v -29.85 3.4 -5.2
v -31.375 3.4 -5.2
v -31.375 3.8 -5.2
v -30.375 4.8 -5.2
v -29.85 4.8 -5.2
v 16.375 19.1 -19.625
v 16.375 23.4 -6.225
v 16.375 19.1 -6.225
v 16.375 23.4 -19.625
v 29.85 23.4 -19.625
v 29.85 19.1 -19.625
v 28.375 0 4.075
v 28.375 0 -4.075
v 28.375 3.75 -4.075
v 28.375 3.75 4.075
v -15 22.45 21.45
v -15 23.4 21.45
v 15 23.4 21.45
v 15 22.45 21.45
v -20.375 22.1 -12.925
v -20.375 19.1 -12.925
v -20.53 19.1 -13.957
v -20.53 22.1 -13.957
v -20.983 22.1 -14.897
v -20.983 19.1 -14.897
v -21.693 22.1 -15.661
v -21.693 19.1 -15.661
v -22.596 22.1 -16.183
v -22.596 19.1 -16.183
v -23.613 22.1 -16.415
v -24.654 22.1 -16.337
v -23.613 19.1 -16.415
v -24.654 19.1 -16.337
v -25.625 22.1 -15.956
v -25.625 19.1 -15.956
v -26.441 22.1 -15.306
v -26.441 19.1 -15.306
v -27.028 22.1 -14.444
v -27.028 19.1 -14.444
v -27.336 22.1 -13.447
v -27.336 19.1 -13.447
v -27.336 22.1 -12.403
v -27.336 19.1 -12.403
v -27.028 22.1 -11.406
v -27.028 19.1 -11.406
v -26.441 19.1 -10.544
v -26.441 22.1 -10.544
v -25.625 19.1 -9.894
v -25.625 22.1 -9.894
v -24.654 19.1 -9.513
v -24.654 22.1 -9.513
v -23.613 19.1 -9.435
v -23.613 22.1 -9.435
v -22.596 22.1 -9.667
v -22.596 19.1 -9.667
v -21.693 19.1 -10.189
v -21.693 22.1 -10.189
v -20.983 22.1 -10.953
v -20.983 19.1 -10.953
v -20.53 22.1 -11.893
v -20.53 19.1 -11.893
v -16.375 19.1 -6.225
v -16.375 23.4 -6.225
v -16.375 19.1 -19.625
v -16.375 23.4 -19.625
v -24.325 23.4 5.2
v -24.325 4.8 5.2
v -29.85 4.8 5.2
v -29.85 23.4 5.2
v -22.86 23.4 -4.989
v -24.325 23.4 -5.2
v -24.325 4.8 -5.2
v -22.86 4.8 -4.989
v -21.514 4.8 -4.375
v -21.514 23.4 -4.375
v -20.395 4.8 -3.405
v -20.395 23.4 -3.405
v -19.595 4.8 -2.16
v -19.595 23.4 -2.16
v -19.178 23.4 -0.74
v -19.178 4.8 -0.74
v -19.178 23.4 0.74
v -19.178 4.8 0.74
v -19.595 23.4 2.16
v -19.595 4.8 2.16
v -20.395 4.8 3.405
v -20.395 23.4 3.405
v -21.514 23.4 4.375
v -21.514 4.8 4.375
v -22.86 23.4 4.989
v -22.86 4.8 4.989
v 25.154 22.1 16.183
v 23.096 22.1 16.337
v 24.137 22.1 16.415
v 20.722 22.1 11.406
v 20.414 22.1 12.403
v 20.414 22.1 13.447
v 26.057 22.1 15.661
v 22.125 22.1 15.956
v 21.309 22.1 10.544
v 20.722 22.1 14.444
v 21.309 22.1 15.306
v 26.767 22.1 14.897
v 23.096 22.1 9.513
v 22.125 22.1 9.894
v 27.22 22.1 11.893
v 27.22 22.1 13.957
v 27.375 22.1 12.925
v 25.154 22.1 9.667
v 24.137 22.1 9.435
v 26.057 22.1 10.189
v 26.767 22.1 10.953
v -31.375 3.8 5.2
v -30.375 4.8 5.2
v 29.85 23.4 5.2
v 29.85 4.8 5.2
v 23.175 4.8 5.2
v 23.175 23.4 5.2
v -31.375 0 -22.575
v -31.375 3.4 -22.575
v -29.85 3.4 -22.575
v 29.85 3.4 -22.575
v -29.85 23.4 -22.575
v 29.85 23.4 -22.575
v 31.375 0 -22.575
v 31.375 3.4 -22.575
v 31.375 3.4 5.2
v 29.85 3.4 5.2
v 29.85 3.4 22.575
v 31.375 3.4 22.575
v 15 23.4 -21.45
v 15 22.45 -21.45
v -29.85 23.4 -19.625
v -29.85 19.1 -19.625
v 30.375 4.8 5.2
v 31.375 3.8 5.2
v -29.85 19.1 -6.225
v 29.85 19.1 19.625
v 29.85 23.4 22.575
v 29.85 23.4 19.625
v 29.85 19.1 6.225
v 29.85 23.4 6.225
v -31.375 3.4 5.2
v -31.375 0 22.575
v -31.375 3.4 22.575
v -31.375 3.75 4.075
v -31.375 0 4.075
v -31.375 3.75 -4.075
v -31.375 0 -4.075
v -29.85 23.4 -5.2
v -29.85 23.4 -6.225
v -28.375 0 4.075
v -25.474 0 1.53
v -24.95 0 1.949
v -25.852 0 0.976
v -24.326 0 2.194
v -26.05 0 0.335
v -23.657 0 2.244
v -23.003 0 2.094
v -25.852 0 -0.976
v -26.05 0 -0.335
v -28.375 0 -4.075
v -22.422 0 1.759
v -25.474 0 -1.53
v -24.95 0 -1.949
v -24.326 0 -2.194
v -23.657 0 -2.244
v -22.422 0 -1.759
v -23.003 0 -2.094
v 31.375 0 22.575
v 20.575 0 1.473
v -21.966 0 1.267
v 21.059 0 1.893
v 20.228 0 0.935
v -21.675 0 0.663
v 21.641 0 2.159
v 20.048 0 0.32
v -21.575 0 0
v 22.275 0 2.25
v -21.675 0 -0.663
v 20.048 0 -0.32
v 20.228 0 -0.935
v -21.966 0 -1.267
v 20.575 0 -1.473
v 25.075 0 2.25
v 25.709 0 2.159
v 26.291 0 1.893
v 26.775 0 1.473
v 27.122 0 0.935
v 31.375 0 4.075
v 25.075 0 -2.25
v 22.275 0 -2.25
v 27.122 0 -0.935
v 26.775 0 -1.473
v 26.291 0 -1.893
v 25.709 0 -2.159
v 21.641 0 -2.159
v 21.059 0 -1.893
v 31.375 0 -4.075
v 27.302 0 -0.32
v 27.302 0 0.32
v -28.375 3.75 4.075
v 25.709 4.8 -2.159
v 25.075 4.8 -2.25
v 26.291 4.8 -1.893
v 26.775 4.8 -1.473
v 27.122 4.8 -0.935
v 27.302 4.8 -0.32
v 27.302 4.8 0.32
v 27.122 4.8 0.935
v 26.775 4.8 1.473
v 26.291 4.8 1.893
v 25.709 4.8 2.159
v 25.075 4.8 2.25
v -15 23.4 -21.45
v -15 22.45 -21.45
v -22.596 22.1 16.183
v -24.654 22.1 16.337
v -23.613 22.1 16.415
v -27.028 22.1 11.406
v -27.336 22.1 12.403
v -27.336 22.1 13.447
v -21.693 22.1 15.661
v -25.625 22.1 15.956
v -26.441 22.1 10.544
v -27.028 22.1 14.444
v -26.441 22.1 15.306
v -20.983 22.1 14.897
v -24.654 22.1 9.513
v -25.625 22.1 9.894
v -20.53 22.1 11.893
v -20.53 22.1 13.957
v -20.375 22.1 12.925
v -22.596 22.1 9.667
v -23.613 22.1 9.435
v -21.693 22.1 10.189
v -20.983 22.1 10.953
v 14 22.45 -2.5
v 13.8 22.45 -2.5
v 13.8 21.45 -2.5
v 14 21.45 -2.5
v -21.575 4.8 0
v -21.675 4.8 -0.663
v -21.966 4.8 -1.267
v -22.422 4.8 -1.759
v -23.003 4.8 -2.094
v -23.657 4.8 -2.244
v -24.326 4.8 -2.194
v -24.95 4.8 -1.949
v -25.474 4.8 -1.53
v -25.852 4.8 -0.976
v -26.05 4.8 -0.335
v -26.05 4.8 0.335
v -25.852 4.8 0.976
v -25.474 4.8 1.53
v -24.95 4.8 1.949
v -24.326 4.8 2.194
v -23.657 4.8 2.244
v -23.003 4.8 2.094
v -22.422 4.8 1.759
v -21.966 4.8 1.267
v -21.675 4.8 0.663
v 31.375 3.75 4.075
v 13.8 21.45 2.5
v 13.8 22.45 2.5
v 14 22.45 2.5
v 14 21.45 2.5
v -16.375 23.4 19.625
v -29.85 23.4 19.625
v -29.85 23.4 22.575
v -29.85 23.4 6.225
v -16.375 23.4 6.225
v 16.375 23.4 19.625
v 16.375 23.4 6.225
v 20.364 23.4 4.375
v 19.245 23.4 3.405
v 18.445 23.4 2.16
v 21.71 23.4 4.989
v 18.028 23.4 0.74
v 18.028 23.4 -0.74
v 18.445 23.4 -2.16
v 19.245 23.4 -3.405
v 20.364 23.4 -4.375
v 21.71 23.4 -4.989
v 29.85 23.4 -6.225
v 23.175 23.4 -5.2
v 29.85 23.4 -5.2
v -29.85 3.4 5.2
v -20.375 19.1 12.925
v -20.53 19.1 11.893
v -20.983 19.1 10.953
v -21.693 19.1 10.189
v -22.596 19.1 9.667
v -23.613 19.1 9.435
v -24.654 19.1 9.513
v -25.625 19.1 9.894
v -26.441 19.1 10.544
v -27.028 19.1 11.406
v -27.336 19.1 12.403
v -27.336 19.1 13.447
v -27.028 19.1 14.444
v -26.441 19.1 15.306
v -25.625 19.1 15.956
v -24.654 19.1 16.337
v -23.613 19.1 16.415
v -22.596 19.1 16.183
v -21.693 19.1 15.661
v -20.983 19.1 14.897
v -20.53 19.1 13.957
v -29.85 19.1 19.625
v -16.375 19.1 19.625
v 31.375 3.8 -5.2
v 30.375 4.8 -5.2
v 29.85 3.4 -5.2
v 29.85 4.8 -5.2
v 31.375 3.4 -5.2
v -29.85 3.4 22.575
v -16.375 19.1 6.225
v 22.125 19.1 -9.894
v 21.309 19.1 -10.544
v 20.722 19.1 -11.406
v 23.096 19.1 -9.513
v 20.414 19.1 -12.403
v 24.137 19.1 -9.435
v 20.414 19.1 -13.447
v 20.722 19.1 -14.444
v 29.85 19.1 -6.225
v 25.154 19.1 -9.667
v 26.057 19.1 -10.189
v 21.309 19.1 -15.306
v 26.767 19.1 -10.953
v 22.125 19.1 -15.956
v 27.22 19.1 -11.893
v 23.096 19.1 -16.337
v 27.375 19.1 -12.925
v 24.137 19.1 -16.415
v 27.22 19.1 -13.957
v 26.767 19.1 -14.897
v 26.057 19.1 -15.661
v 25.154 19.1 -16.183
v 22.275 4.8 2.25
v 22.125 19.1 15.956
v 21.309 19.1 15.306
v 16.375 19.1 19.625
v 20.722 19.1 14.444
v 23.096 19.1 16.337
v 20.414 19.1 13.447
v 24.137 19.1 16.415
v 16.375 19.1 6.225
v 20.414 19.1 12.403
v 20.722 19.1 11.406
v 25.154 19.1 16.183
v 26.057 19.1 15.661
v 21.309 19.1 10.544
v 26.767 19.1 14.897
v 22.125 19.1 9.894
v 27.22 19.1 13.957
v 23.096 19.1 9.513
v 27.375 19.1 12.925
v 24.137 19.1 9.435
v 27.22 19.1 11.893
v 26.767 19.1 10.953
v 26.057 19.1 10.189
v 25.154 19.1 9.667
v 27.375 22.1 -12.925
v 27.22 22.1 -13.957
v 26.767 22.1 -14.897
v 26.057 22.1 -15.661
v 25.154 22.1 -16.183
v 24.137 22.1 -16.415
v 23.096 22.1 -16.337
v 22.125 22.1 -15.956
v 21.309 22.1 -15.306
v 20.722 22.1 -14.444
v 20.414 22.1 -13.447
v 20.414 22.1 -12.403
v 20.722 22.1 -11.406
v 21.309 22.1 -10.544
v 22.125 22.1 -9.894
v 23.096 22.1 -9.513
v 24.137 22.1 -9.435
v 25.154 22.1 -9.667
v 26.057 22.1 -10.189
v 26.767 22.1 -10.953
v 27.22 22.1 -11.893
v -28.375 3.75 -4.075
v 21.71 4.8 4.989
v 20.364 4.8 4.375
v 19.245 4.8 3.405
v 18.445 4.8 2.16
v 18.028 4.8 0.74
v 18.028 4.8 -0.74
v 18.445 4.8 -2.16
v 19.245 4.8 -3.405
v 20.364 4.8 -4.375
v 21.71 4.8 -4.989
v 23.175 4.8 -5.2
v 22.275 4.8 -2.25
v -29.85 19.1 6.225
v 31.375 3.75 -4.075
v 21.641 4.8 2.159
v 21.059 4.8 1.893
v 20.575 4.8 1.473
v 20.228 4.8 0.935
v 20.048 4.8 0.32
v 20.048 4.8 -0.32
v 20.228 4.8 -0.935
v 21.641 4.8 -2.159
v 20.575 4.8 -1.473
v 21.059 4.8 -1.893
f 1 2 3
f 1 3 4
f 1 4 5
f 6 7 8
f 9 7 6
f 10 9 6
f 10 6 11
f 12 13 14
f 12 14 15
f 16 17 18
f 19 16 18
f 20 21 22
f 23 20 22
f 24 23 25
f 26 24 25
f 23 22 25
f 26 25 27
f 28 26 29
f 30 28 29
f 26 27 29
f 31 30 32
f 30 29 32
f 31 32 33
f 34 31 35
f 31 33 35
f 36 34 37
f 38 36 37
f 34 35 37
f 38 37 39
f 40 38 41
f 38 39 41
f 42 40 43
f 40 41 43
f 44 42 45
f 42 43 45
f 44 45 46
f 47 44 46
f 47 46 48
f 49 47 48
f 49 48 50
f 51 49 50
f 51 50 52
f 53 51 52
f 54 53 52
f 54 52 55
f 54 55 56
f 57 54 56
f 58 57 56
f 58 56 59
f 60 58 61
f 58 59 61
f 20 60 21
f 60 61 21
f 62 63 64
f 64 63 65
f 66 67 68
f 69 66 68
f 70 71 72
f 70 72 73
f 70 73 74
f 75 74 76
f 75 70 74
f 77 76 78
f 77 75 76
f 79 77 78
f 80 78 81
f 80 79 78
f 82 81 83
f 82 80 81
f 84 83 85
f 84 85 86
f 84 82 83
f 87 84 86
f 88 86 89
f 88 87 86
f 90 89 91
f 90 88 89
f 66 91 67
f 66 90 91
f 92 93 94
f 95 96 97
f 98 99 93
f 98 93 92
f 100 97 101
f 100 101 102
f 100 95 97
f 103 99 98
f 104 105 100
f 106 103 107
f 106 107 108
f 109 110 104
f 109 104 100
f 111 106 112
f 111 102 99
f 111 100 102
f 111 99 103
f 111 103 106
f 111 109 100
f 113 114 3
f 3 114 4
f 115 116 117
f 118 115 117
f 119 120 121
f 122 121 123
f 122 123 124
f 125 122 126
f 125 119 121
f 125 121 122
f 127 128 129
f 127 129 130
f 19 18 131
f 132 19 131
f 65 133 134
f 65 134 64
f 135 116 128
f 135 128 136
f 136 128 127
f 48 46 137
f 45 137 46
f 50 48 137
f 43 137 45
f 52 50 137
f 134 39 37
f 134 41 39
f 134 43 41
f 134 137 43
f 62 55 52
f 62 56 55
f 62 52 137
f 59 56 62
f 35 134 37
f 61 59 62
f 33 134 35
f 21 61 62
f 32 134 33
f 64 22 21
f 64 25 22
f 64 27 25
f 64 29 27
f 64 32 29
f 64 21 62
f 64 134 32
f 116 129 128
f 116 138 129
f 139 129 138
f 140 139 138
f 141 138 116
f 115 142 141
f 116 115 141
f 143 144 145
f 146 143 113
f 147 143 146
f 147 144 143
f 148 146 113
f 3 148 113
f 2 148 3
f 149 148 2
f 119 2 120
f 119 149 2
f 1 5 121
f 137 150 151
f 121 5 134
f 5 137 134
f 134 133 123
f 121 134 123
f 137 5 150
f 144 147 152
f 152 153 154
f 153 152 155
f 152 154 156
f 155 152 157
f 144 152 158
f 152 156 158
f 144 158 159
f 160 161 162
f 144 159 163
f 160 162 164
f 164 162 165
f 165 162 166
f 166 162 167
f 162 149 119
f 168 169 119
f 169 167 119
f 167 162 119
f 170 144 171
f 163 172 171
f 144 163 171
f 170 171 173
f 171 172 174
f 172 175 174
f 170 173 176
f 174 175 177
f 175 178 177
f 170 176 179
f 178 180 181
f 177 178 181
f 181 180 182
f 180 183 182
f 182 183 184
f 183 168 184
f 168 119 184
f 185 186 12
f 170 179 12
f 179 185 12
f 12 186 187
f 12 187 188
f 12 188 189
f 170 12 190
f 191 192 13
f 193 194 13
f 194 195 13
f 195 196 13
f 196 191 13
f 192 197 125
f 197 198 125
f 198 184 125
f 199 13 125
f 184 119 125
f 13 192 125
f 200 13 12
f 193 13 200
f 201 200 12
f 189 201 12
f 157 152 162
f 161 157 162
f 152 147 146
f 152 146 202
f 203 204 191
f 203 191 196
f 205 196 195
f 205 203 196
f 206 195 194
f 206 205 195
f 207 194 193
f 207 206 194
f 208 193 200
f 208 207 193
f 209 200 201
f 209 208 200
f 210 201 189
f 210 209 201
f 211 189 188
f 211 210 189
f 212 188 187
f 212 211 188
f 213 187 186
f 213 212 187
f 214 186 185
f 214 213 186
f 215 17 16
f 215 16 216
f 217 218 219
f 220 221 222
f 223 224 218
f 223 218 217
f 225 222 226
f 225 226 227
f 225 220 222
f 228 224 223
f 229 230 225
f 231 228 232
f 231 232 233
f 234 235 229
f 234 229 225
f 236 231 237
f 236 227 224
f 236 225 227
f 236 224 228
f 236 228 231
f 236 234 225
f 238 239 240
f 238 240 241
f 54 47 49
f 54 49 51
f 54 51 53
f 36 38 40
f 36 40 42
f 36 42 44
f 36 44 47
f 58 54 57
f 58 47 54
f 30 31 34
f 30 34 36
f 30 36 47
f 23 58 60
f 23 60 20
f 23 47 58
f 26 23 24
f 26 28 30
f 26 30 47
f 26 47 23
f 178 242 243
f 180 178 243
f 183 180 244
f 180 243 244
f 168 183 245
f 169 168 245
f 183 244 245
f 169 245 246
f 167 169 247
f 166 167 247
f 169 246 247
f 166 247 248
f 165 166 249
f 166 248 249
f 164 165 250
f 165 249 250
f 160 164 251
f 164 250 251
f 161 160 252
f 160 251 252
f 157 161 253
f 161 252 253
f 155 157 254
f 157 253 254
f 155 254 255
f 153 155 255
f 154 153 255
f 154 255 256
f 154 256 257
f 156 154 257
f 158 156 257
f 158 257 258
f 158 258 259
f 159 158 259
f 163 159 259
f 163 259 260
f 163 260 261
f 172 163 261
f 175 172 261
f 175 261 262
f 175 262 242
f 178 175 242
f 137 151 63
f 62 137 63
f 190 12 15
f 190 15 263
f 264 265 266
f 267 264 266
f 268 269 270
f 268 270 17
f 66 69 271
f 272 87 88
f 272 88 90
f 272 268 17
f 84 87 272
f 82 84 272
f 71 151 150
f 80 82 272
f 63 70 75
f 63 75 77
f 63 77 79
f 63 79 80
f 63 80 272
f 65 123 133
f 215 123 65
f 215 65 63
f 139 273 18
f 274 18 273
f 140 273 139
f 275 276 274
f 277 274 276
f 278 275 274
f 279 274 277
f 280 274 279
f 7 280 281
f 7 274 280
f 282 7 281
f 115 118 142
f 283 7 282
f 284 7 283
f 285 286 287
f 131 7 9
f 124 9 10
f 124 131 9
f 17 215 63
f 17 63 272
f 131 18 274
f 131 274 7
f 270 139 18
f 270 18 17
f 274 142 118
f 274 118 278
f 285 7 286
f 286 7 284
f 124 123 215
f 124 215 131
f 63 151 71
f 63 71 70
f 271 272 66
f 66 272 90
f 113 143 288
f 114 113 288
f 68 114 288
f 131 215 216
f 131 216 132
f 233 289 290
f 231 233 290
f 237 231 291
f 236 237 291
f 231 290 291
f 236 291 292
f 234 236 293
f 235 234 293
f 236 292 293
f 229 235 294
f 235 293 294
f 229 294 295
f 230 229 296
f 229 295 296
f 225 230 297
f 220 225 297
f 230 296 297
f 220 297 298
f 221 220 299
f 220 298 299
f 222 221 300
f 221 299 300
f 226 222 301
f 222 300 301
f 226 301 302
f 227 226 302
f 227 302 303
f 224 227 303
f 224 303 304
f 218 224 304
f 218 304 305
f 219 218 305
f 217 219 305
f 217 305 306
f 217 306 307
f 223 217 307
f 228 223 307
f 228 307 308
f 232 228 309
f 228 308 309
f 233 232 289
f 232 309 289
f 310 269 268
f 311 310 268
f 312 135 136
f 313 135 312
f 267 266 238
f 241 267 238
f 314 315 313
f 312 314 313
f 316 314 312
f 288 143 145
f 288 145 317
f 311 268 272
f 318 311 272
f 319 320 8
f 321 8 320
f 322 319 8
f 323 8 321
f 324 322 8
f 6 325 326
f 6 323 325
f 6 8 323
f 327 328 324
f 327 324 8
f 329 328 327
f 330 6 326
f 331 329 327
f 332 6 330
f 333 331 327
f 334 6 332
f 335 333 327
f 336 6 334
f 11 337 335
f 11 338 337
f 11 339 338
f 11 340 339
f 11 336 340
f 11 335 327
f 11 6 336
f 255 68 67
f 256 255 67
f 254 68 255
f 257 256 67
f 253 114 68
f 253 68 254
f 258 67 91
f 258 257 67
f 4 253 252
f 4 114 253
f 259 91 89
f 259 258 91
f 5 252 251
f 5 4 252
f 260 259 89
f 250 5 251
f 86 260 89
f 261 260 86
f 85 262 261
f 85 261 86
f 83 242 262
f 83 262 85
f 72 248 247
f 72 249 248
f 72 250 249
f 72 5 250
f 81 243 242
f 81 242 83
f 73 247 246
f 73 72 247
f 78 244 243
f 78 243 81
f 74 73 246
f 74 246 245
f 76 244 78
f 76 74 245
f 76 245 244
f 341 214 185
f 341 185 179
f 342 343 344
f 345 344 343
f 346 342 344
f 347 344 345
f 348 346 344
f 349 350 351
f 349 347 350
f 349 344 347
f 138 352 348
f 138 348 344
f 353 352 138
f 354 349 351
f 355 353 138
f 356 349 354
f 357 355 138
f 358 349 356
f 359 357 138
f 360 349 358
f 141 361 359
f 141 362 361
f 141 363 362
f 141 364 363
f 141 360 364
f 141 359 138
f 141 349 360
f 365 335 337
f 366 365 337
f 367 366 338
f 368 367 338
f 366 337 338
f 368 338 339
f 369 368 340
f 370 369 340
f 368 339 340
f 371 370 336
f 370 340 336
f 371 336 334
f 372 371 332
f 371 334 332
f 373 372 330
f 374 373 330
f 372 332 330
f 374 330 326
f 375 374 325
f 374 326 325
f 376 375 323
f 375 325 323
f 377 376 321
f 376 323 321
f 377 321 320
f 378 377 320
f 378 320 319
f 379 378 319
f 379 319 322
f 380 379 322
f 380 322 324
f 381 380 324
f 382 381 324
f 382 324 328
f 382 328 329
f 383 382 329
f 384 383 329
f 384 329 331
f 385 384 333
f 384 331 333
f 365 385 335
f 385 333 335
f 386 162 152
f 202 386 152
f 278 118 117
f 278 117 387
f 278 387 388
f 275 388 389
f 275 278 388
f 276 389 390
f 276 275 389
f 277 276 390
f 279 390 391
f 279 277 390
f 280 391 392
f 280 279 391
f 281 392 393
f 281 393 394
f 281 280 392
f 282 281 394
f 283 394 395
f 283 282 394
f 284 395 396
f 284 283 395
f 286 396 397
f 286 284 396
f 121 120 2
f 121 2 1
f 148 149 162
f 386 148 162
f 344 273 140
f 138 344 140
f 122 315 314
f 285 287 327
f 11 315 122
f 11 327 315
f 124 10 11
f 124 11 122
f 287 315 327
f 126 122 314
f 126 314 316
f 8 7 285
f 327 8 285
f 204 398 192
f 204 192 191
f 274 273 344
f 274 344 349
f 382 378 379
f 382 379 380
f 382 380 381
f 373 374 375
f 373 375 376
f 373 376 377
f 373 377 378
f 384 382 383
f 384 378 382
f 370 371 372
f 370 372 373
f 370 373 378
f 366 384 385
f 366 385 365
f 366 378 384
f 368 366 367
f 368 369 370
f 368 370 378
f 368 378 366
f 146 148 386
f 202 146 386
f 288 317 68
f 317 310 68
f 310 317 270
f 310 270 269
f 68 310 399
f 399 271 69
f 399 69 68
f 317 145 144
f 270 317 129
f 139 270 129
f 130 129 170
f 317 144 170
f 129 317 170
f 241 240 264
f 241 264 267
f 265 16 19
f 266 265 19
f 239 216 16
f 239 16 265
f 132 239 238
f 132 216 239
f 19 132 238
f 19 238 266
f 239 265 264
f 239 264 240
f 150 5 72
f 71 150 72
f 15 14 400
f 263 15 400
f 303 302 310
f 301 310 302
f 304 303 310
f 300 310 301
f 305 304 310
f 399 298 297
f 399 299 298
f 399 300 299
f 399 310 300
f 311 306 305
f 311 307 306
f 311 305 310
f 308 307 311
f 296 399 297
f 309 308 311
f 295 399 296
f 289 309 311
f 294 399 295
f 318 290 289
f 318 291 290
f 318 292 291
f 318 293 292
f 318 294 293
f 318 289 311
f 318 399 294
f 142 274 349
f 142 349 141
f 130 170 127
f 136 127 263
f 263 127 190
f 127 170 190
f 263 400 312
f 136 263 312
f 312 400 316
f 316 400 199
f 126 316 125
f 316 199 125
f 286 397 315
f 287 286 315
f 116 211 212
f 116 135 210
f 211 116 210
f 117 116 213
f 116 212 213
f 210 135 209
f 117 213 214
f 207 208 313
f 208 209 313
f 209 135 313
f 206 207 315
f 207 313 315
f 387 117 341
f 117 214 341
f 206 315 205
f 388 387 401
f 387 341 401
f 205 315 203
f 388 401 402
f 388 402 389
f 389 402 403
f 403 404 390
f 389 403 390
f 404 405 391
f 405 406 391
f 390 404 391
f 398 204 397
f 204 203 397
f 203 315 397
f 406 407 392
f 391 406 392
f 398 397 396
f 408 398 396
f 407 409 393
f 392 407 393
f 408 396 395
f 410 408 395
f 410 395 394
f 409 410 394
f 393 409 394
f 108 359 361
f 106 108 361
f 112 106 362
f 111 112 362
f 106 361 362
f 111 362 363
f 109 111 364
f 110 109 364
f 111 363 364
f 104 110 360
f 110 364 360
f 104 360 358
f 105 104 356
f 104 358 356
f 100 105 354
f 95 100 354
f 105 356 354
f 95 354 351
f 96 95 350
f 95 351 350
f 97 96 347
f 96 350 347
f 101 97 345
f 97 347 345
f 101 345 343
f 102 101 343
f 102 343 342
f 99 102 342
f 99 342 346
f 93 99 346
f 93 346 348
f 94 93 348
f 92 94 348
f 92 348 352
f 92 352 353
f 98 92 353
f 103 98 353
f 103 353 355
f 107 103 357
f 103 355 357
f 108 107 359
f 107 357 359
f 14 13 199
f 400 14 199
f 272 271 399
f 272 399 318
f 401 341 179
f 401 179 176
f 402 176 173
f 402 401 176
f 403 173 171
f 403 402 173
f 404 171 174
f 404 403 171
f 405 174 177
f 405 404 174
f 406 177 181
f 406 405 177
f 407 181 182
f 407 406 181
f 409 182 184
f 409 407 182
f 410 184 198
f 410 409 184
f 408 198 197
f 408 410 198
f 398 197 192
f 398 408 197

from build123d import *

# Parameters (mm, degrees)
SKETCH1_W                    = 62.75
SKETCH1_H                    = 45.15
BOSS_EXTRUDE1_DEPTH          = 23.4
SKETCH2_W                    = 30
SKETCH2_H                    = 42.9
CUT_EXTRUDE1_DEPTH           = 0.95
SKETCH3_W                    = 15
SKETCH3_H                    = 13.4
CUT_EXTRUDE2_DEPTH           = 4.3
SKETCH4_R                    = 3.5
BOSS_EXTRUDE2_DEPTH          = 3
CUT_EXTRUDE3_DEPTH           = 18.6
SKETCH6_W                    = 0.2
SKETCH6_H                    = 5
CUT_EXTRUDE_THIN1_DEPTH      = 1.95
CUT_EXTRUDE_THIN1_DEPTH_BACK = 1
CUT_EXTRUDE4_DEPTH           = 5.8
SKETCH8_R                    = 2.25
CUT_EXTRUDE5_DEPTH           = 5.8
SKETCH9_W                    = 1.525
SKETCH9_H                    = 45.15
CUT_EXTRUDE6_DEPTH           = 20
SKETCH11_W                   = 1.525
SKETCH11_H                   = 10.4
BOSS_EXTRUDE3_DEPTH          = 1.4
CHAMFER1_SIZE                = 1
SKETCH10_W                   = 3
SKETCH10_H                   = 8.15
CUT_EXTRUDE7_DEPTH           = 3.75


with BuildPart() as part:
    # Sketch1 → Boss-Extrude1 (new body)
    with BuildSketch(Plane(origin=(0, 0, 0), x_dir=(1, 0, 0), z_dir=(0, 1, 0))):
        Rectangle(SKETCH1_W, SKETCH1_H)
    extrude(amount=BOSS_EXTRUDE1_DEPTH)

    # Sketch2 → Cut-Extrude1 (cut)
    with BuildSketch(Plane(origin=(0, 23.4, 0), x_dir=(1, 0, 0), z_dir=(0, 1, 0))):
        Rectangle(SKETCH2_W, SKETCH2_H)
    extrude(amount=-CUT_EXTRUDE1_DEPTH, mode=Mode.SUBTRACT)

    # Sketch3 → Cut-Extrude2 (cut)
    with BuildSketch(Plane(origin=(0, 23.4, 0), x_dir=(1, 0, 0), z_dir=(0, 1, 0))):
        with Locations((-23.875, 12.925)):
            Rectangle(SKETCH3_W, SKETCH3_H)
        with Locations((-23.875, -12.925)):
            Rectangle(SKETCH3_W, SKETCH3_H)
        with Locations((23.875, -12.925)):
            Rectangle(SKETCH3_W, SKETCH3_H)
        with Locations((23.875, 12.925)):
            Rectangle(SKETCH3_W, SKETCH3_H)
    extrude(amount=-CUT_EXTRUDE2_DEPTH, mode=Mode.SUBTRACT)

    # Sketch4 → Boss-Extrude2 (add)
    with BuildSketch(Plane(origin=(0, 19.1, 0), x_dir=(1, 0, 0), z_dir=(0, 1, 0))):
        with Locations((-23.875, 12.925)):
            Circle(SKETCH4_R)
        with Locations((-23.875, -12.925)):
            Circle(SKETCH4_R)
        with Locations((23.875, -12.925)):
            Circle(SKETCH4_R)
        with Locations((23.875, 12.925)):
            Circle(SKETCH4_R)
    extrude(amount=BOSS_EXTRUDE2_DEPTH)

    # Sketch5 → Cut-Extrude3 (cut)
    with BuildSketch(Plane(origin=(0, 23.4, 0), x_dir=(1, 0, 0), z_dir=(0, 1, 0))):
        with BuildLine():
            Line((31.375, -5.2), (23.175, -5.2))
            ThreePointArc((23.175, -5.2), (17.975, 0), (23.175, 5.2))
            Line((23.175, 5.2), (31.375, 5.2))
            ThreePointArc((31.375, 5.2), (36.575, 0), (31.375, -5.2))
        make_face()
        with BuildLine():
            Line((-31.375, 5.2), (-24.325, 5.2))
            ThreePointArc((-24.325, 5.2), (-19.125, 0), (-24.325, -5.2))
            Line((-24.325, -5.2), (-31.375, -5.2))
            ThreePointArc((-31.375, -5.2), (-36.575, 0), (-31.375, 5.2))
        make_face()
    extrude(amount=-CUT_EXTRUDE3_DEPTH, mode=Mode.SUBTRACT)

    # Sketch6 → Cut-Extrude-Thin1 (cut, two sides)
    with BuildSketch(Plane(origin=(0, 22.45, 0), x_dir=(1, 0, 0), z_dir=(0, 1, 0))) as cut_extrude_thin1_sk:
        with Locations((13.9, 0)):
            Rectangle(SKETCH6_W, SKETCH6_H)
    extrude(amount=CUT_EXTRUDE_THIN1_DEPTH, mode=Mode.SUBTRACT)
    extrude(cut_extrude_thin1_sk.sketch, amount=-CUT_EXTRUDE_THIN1_DEPTH_BACK, mode=Mode.SUBTRACT)

    # Sketch7 → Cut-Extrude4 (cut, through all)
    with BuildSketch(Plane(origin=(0, 4.8, 0), x_dir=(1, 0, 0), z_dir=(0, 1, 0))):
        with BuildLine():
            Line((22.275, 2.25), (25.075, 2.25))
            ThreePointArc((25.075, 2.25), (27.325, 0), (25.075, -2.25))
            Line((25.075, -2.25), (22.275, -2.25))
            ThreePointArc((22.275, -2.25), (20.025, 0), (22.275, 2.25))
        make_face()
    extrude(amount=-CUT_EXTRUDE4_DEPTH, mode=Mode.SUBTRACT)

    # Sketch8 → Cut-Extrude5 (cut, through all)
    with BuildSketch(Plane(origin=(0, 4.8, 0), x_dir=(1, 0, 0), z_dir=(0, 1, 0))):
        with Locations((-23.825, 0)):
            Circle(SKETCH8_R)
    extrude(amount=-CUT_EXTRUDE5_DEPTH, mode=Mode.SUBTRACT)

    # Sketch9 → Cut-Extrude6 (cut)
    with BuildSketch(Plane(origin=(0, 23.4, 0), x_dir=(1, 0, 0), z_dir=(0, 1, 0))):
        with Locations((-30.6125, 0)):
            Rectangle(SKETCH9_W, SKETCH9_H)
        with Locations((30.6125, 0)):
            Rectangle(SKETCH9_W, SKETCH9_H)
    extrude(amount=-CUT_EXTRUDE6_DEPTH, mode=Mode.SUBTRACT)

    # Sketch11 → Boss-Extrude3 (add)
    with BuildSketch(Plane(origin=(0, 3.4, 0), x_dir=(1, 0, 0), z_dir=(0, 1, 0))):
        with Locations((-30.6125, 0)):
            Rectangle(SKETCH11_W, SKETCH11_H)
        with Locations((30.6125, 0)):
            Rectangle(SKETCH11_W, SKETCH11_H)
    extrude(amount=BOSS_EXTRUDE3_DEPTH)

    # Chamfer1
    chamfer1_edges = [part.edges().sort_by_distance(p)[0] for p in [
        (-31.375, 4.8, 0),
        (31.375, 4.8, 0),
    ]]
    chamfer(chamfer1_edges, length=CHAMFER1_SIZE)

    # Sketch10 → Cut-Extrude7 (cut)
    with BuildSketch(Plane.XZ):
        with Locations((29.875, 0)):
            Rectangle(SKETCH10_W, SKETCH10_H)
        with Locations((-29.875, 0)):
            Rectangle(SKETCH10_W, SKETCH10_H)
    extrude(amount=-CUT_EXTRUDE7_DEPTH, mode=Mode.SUBTRACT)


solid = part.part
